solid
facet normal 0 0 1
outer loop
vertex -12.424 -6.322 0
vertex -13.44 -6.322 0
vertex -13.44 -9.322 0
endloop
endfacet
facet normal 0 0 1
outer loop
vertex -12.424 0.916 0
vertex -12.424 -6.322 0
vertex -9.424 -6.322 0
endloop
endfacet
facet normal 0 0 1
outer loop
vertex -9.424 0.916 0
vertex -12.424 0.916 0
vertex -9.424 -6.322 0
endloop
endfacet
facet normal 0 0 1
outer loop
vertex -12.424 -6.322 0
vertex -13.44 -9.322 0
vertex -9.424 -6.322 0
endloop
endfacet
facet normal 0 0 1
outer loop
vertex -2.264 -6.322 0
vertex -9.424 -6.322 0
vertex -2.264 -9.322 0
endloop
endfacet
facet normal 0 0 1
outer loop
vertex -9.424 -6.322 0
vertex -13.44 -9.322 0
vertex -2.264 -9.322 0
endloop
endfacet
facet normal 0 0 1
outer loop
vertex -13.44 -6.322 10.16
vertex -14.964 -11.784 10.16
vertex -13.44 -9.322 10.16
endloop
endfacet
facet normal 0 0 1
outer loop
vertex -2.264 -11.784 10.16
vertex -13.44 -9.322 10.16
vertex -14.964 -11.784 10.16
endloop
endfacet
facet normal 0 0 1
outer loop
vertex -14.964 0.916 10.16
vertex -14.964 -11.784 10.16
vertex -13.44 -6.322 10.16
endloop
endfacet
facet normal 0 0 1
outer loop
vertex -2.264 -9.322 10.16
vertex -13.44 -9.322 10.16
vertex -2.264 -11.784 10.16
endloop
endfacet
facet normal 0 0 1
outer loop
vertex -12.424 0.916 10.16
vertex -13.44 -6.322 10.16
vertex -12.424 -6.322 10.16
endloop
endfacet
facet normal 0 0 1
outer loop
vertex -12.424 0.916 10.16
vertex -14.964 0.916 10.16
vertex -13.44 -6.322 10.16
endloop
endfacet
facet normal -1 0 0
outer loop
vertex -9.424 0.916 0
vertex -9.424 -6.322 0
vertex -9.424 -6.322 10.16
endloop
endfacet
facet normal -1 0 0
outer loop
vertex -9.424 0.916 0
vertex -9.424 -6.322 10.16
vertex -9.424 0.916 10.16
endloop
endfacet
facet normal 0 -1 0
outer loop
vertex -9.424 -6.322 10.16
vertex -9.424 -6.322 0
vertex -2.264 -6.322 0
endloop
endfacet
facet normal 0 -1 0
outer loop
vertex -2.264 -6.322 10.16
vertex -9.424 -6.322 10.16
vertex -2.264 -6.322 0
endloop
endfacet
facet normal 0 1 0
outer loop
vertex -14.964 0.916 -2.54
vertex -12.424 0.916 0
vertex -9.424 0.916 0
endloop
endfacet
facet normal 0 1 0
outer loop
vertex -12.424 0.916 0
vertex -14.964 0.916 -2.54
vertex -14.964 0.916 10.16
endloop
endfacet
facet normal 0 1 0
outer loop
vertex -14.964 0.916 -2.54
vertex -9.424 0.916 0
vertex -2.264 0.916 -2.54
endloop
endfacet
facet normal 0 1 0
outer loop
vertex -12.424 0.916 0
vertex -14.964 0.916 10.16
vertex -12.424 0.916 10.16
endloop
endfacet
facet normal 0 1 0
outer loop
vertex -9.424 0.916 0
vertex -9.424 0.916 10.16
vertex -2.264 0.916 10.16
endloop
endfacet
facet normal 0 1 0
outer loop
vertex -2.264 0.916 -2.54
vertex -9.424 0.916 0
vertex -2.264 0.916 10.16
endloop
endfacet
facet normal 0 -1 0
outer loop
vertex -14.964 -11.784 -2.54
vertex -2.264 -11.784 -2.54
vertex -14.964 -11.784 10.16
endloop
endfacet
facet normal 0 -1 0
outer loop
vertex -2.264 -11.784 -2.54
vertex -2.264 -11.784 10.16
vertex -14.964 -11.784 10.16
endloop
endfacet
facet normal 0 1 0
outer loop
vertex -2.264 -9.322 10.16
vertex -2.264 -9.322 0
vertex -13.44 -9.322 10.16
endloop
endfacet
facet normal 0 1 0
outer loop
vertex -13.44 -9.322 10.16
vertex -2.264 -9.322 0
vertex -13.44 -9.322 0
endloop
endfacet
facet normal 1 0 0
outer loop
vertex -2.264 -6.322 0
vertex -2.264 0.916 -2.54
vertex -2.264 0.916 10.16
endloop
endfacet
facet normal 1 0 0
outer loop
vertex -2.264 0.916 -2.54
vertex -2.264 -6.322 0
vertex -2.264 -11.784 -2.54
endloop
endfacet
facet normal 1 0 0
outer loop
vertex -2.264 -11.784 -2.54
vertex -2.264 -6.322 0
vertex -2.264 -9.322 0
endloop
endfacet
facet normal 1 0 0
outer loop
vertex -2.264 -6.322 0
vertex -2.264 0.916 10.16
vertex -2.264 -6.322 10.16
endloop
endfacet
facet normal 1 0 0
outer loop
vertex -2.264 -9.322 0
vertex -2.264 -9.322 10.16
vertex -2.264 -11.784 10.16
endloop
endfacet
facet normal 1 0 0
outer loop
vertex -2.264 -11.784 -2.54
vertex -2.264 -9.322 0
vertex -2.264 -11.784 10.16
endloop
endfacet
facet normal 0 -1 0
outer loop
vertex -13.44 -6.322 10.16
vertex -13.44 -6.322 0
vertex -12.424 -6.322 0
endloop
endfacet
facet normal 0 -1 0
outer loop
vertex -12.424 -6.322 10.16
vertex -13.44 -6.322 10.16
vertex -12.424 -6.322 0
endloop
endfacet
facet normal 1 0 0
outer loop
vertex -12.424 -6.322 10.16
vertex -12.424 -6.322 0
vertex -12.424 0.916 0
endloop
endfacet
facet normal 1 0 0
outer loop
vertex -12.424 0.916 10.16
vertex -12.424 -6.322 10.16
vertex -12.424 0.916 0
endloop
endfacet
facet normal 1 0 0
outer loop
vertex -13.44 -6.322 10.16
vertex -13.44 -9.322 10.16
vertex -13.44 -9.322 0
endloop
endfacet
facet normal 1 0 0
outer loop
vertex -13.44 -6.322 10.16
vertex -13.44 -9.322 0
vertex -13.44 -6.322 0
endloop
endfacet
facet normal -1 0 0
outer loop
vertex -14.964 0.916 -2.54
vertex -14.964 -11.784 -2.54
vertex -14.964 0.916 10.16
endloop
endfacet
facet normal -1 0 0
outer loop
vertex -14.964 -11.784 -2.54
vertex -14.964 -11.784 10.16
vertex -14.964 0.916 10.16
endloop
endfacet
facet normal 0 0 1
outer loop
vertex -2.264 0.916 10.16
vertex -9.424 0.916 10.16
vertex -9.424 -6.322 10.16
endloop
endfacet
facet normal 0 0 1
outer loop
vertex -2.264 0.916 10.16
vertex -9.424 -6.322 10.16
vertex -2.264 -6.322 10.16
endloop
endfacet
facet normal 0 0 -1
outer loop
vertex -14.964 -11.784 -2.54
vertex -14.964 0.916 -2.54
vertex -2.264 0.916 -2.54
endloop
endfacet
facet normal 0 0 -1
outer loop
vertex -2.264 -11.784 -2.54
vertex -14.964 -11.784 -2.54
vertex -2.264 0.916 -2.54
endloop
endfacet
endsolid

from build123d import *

# Parameters (mm, degrees)
F0_W     = 7.16
F0_H     = 7.2381474632
F1_DEPTH = 10.16
F2_W     = 7.16
F2_H     = 7.2381474632
F3_DEPTH = 2.54


with BuildPart() as f1:
    # F0 (on Top) → F1 (new body)
    with BuildSketch(Plane.XY):
        with Locations((-5.8439813066, -2.7033329925)):
            Rectangle(F0_W, F0_H)
    extrude(amount=F1_DEPTH)



with BuildPart() as f1b:
    # F0 (on Top) → F1, piece 2 (new body)
    with BuildSketch(Plane.XY):
        Polygon((-12.4239813066, 0.9157407391), (-14.9639813066, 0.9157407391), (-14.9639813066, -11.7842592609), (-2.2639813066, -11.7842592609), (-2.2639813066, -9.3224067241), (-9.4239813066, -9.3224067241), (-12.4239813066, -9.3224067241), (-13.4399813066, -9.3224067241), (-13.4399813066, -6.3224067241), (-12.4239813066, -6.3224067241), align=None)
    extrude(amount=F1_DEPTH)


with BuildPart() as f1_1:
    add(f1.part)

    add(f1b.part)  # F3 merges F1b
    # F2 (on face) → F3 (join)
    with BuildSketch(Plane(origin=(0, 0, 0), x_dir=(1, 0, 0), z_dir=(0, 0, -1))):
        with Locations((-5.8439813066, 2.7033329925)):
            Rectangle(F2_W, F2_H)
        Polygon((-2.2639813066, 9.3224067241), (-13.4399813066, 9.3224067241), (-13.4399813066, 6.3224067241), (-12.4239813066, 6.3224067241), (-12.4239813066, -0.9157407391), (-9.4239813066, -0.9157407391), (-9.4239813066, 6.3224067241), (-2.2639813066, 6.3224067241), align=None)
        Polygon((-13.4399813066, 6.3224067241), (-13.4399813066, 9.3224067241), (-2.2639813066, 9.3224067241), (-2.2639813066, 11.7842592609), (-14.9639813066, 11.7842592609), (-14.9639813066, -0.9157407391), (-12.4239813066, -0.9157407391), (-12.4239813066, 6.3224067241), align=None)
    extrude(amount=F3_DEPTH)


solid = f1_1.part
